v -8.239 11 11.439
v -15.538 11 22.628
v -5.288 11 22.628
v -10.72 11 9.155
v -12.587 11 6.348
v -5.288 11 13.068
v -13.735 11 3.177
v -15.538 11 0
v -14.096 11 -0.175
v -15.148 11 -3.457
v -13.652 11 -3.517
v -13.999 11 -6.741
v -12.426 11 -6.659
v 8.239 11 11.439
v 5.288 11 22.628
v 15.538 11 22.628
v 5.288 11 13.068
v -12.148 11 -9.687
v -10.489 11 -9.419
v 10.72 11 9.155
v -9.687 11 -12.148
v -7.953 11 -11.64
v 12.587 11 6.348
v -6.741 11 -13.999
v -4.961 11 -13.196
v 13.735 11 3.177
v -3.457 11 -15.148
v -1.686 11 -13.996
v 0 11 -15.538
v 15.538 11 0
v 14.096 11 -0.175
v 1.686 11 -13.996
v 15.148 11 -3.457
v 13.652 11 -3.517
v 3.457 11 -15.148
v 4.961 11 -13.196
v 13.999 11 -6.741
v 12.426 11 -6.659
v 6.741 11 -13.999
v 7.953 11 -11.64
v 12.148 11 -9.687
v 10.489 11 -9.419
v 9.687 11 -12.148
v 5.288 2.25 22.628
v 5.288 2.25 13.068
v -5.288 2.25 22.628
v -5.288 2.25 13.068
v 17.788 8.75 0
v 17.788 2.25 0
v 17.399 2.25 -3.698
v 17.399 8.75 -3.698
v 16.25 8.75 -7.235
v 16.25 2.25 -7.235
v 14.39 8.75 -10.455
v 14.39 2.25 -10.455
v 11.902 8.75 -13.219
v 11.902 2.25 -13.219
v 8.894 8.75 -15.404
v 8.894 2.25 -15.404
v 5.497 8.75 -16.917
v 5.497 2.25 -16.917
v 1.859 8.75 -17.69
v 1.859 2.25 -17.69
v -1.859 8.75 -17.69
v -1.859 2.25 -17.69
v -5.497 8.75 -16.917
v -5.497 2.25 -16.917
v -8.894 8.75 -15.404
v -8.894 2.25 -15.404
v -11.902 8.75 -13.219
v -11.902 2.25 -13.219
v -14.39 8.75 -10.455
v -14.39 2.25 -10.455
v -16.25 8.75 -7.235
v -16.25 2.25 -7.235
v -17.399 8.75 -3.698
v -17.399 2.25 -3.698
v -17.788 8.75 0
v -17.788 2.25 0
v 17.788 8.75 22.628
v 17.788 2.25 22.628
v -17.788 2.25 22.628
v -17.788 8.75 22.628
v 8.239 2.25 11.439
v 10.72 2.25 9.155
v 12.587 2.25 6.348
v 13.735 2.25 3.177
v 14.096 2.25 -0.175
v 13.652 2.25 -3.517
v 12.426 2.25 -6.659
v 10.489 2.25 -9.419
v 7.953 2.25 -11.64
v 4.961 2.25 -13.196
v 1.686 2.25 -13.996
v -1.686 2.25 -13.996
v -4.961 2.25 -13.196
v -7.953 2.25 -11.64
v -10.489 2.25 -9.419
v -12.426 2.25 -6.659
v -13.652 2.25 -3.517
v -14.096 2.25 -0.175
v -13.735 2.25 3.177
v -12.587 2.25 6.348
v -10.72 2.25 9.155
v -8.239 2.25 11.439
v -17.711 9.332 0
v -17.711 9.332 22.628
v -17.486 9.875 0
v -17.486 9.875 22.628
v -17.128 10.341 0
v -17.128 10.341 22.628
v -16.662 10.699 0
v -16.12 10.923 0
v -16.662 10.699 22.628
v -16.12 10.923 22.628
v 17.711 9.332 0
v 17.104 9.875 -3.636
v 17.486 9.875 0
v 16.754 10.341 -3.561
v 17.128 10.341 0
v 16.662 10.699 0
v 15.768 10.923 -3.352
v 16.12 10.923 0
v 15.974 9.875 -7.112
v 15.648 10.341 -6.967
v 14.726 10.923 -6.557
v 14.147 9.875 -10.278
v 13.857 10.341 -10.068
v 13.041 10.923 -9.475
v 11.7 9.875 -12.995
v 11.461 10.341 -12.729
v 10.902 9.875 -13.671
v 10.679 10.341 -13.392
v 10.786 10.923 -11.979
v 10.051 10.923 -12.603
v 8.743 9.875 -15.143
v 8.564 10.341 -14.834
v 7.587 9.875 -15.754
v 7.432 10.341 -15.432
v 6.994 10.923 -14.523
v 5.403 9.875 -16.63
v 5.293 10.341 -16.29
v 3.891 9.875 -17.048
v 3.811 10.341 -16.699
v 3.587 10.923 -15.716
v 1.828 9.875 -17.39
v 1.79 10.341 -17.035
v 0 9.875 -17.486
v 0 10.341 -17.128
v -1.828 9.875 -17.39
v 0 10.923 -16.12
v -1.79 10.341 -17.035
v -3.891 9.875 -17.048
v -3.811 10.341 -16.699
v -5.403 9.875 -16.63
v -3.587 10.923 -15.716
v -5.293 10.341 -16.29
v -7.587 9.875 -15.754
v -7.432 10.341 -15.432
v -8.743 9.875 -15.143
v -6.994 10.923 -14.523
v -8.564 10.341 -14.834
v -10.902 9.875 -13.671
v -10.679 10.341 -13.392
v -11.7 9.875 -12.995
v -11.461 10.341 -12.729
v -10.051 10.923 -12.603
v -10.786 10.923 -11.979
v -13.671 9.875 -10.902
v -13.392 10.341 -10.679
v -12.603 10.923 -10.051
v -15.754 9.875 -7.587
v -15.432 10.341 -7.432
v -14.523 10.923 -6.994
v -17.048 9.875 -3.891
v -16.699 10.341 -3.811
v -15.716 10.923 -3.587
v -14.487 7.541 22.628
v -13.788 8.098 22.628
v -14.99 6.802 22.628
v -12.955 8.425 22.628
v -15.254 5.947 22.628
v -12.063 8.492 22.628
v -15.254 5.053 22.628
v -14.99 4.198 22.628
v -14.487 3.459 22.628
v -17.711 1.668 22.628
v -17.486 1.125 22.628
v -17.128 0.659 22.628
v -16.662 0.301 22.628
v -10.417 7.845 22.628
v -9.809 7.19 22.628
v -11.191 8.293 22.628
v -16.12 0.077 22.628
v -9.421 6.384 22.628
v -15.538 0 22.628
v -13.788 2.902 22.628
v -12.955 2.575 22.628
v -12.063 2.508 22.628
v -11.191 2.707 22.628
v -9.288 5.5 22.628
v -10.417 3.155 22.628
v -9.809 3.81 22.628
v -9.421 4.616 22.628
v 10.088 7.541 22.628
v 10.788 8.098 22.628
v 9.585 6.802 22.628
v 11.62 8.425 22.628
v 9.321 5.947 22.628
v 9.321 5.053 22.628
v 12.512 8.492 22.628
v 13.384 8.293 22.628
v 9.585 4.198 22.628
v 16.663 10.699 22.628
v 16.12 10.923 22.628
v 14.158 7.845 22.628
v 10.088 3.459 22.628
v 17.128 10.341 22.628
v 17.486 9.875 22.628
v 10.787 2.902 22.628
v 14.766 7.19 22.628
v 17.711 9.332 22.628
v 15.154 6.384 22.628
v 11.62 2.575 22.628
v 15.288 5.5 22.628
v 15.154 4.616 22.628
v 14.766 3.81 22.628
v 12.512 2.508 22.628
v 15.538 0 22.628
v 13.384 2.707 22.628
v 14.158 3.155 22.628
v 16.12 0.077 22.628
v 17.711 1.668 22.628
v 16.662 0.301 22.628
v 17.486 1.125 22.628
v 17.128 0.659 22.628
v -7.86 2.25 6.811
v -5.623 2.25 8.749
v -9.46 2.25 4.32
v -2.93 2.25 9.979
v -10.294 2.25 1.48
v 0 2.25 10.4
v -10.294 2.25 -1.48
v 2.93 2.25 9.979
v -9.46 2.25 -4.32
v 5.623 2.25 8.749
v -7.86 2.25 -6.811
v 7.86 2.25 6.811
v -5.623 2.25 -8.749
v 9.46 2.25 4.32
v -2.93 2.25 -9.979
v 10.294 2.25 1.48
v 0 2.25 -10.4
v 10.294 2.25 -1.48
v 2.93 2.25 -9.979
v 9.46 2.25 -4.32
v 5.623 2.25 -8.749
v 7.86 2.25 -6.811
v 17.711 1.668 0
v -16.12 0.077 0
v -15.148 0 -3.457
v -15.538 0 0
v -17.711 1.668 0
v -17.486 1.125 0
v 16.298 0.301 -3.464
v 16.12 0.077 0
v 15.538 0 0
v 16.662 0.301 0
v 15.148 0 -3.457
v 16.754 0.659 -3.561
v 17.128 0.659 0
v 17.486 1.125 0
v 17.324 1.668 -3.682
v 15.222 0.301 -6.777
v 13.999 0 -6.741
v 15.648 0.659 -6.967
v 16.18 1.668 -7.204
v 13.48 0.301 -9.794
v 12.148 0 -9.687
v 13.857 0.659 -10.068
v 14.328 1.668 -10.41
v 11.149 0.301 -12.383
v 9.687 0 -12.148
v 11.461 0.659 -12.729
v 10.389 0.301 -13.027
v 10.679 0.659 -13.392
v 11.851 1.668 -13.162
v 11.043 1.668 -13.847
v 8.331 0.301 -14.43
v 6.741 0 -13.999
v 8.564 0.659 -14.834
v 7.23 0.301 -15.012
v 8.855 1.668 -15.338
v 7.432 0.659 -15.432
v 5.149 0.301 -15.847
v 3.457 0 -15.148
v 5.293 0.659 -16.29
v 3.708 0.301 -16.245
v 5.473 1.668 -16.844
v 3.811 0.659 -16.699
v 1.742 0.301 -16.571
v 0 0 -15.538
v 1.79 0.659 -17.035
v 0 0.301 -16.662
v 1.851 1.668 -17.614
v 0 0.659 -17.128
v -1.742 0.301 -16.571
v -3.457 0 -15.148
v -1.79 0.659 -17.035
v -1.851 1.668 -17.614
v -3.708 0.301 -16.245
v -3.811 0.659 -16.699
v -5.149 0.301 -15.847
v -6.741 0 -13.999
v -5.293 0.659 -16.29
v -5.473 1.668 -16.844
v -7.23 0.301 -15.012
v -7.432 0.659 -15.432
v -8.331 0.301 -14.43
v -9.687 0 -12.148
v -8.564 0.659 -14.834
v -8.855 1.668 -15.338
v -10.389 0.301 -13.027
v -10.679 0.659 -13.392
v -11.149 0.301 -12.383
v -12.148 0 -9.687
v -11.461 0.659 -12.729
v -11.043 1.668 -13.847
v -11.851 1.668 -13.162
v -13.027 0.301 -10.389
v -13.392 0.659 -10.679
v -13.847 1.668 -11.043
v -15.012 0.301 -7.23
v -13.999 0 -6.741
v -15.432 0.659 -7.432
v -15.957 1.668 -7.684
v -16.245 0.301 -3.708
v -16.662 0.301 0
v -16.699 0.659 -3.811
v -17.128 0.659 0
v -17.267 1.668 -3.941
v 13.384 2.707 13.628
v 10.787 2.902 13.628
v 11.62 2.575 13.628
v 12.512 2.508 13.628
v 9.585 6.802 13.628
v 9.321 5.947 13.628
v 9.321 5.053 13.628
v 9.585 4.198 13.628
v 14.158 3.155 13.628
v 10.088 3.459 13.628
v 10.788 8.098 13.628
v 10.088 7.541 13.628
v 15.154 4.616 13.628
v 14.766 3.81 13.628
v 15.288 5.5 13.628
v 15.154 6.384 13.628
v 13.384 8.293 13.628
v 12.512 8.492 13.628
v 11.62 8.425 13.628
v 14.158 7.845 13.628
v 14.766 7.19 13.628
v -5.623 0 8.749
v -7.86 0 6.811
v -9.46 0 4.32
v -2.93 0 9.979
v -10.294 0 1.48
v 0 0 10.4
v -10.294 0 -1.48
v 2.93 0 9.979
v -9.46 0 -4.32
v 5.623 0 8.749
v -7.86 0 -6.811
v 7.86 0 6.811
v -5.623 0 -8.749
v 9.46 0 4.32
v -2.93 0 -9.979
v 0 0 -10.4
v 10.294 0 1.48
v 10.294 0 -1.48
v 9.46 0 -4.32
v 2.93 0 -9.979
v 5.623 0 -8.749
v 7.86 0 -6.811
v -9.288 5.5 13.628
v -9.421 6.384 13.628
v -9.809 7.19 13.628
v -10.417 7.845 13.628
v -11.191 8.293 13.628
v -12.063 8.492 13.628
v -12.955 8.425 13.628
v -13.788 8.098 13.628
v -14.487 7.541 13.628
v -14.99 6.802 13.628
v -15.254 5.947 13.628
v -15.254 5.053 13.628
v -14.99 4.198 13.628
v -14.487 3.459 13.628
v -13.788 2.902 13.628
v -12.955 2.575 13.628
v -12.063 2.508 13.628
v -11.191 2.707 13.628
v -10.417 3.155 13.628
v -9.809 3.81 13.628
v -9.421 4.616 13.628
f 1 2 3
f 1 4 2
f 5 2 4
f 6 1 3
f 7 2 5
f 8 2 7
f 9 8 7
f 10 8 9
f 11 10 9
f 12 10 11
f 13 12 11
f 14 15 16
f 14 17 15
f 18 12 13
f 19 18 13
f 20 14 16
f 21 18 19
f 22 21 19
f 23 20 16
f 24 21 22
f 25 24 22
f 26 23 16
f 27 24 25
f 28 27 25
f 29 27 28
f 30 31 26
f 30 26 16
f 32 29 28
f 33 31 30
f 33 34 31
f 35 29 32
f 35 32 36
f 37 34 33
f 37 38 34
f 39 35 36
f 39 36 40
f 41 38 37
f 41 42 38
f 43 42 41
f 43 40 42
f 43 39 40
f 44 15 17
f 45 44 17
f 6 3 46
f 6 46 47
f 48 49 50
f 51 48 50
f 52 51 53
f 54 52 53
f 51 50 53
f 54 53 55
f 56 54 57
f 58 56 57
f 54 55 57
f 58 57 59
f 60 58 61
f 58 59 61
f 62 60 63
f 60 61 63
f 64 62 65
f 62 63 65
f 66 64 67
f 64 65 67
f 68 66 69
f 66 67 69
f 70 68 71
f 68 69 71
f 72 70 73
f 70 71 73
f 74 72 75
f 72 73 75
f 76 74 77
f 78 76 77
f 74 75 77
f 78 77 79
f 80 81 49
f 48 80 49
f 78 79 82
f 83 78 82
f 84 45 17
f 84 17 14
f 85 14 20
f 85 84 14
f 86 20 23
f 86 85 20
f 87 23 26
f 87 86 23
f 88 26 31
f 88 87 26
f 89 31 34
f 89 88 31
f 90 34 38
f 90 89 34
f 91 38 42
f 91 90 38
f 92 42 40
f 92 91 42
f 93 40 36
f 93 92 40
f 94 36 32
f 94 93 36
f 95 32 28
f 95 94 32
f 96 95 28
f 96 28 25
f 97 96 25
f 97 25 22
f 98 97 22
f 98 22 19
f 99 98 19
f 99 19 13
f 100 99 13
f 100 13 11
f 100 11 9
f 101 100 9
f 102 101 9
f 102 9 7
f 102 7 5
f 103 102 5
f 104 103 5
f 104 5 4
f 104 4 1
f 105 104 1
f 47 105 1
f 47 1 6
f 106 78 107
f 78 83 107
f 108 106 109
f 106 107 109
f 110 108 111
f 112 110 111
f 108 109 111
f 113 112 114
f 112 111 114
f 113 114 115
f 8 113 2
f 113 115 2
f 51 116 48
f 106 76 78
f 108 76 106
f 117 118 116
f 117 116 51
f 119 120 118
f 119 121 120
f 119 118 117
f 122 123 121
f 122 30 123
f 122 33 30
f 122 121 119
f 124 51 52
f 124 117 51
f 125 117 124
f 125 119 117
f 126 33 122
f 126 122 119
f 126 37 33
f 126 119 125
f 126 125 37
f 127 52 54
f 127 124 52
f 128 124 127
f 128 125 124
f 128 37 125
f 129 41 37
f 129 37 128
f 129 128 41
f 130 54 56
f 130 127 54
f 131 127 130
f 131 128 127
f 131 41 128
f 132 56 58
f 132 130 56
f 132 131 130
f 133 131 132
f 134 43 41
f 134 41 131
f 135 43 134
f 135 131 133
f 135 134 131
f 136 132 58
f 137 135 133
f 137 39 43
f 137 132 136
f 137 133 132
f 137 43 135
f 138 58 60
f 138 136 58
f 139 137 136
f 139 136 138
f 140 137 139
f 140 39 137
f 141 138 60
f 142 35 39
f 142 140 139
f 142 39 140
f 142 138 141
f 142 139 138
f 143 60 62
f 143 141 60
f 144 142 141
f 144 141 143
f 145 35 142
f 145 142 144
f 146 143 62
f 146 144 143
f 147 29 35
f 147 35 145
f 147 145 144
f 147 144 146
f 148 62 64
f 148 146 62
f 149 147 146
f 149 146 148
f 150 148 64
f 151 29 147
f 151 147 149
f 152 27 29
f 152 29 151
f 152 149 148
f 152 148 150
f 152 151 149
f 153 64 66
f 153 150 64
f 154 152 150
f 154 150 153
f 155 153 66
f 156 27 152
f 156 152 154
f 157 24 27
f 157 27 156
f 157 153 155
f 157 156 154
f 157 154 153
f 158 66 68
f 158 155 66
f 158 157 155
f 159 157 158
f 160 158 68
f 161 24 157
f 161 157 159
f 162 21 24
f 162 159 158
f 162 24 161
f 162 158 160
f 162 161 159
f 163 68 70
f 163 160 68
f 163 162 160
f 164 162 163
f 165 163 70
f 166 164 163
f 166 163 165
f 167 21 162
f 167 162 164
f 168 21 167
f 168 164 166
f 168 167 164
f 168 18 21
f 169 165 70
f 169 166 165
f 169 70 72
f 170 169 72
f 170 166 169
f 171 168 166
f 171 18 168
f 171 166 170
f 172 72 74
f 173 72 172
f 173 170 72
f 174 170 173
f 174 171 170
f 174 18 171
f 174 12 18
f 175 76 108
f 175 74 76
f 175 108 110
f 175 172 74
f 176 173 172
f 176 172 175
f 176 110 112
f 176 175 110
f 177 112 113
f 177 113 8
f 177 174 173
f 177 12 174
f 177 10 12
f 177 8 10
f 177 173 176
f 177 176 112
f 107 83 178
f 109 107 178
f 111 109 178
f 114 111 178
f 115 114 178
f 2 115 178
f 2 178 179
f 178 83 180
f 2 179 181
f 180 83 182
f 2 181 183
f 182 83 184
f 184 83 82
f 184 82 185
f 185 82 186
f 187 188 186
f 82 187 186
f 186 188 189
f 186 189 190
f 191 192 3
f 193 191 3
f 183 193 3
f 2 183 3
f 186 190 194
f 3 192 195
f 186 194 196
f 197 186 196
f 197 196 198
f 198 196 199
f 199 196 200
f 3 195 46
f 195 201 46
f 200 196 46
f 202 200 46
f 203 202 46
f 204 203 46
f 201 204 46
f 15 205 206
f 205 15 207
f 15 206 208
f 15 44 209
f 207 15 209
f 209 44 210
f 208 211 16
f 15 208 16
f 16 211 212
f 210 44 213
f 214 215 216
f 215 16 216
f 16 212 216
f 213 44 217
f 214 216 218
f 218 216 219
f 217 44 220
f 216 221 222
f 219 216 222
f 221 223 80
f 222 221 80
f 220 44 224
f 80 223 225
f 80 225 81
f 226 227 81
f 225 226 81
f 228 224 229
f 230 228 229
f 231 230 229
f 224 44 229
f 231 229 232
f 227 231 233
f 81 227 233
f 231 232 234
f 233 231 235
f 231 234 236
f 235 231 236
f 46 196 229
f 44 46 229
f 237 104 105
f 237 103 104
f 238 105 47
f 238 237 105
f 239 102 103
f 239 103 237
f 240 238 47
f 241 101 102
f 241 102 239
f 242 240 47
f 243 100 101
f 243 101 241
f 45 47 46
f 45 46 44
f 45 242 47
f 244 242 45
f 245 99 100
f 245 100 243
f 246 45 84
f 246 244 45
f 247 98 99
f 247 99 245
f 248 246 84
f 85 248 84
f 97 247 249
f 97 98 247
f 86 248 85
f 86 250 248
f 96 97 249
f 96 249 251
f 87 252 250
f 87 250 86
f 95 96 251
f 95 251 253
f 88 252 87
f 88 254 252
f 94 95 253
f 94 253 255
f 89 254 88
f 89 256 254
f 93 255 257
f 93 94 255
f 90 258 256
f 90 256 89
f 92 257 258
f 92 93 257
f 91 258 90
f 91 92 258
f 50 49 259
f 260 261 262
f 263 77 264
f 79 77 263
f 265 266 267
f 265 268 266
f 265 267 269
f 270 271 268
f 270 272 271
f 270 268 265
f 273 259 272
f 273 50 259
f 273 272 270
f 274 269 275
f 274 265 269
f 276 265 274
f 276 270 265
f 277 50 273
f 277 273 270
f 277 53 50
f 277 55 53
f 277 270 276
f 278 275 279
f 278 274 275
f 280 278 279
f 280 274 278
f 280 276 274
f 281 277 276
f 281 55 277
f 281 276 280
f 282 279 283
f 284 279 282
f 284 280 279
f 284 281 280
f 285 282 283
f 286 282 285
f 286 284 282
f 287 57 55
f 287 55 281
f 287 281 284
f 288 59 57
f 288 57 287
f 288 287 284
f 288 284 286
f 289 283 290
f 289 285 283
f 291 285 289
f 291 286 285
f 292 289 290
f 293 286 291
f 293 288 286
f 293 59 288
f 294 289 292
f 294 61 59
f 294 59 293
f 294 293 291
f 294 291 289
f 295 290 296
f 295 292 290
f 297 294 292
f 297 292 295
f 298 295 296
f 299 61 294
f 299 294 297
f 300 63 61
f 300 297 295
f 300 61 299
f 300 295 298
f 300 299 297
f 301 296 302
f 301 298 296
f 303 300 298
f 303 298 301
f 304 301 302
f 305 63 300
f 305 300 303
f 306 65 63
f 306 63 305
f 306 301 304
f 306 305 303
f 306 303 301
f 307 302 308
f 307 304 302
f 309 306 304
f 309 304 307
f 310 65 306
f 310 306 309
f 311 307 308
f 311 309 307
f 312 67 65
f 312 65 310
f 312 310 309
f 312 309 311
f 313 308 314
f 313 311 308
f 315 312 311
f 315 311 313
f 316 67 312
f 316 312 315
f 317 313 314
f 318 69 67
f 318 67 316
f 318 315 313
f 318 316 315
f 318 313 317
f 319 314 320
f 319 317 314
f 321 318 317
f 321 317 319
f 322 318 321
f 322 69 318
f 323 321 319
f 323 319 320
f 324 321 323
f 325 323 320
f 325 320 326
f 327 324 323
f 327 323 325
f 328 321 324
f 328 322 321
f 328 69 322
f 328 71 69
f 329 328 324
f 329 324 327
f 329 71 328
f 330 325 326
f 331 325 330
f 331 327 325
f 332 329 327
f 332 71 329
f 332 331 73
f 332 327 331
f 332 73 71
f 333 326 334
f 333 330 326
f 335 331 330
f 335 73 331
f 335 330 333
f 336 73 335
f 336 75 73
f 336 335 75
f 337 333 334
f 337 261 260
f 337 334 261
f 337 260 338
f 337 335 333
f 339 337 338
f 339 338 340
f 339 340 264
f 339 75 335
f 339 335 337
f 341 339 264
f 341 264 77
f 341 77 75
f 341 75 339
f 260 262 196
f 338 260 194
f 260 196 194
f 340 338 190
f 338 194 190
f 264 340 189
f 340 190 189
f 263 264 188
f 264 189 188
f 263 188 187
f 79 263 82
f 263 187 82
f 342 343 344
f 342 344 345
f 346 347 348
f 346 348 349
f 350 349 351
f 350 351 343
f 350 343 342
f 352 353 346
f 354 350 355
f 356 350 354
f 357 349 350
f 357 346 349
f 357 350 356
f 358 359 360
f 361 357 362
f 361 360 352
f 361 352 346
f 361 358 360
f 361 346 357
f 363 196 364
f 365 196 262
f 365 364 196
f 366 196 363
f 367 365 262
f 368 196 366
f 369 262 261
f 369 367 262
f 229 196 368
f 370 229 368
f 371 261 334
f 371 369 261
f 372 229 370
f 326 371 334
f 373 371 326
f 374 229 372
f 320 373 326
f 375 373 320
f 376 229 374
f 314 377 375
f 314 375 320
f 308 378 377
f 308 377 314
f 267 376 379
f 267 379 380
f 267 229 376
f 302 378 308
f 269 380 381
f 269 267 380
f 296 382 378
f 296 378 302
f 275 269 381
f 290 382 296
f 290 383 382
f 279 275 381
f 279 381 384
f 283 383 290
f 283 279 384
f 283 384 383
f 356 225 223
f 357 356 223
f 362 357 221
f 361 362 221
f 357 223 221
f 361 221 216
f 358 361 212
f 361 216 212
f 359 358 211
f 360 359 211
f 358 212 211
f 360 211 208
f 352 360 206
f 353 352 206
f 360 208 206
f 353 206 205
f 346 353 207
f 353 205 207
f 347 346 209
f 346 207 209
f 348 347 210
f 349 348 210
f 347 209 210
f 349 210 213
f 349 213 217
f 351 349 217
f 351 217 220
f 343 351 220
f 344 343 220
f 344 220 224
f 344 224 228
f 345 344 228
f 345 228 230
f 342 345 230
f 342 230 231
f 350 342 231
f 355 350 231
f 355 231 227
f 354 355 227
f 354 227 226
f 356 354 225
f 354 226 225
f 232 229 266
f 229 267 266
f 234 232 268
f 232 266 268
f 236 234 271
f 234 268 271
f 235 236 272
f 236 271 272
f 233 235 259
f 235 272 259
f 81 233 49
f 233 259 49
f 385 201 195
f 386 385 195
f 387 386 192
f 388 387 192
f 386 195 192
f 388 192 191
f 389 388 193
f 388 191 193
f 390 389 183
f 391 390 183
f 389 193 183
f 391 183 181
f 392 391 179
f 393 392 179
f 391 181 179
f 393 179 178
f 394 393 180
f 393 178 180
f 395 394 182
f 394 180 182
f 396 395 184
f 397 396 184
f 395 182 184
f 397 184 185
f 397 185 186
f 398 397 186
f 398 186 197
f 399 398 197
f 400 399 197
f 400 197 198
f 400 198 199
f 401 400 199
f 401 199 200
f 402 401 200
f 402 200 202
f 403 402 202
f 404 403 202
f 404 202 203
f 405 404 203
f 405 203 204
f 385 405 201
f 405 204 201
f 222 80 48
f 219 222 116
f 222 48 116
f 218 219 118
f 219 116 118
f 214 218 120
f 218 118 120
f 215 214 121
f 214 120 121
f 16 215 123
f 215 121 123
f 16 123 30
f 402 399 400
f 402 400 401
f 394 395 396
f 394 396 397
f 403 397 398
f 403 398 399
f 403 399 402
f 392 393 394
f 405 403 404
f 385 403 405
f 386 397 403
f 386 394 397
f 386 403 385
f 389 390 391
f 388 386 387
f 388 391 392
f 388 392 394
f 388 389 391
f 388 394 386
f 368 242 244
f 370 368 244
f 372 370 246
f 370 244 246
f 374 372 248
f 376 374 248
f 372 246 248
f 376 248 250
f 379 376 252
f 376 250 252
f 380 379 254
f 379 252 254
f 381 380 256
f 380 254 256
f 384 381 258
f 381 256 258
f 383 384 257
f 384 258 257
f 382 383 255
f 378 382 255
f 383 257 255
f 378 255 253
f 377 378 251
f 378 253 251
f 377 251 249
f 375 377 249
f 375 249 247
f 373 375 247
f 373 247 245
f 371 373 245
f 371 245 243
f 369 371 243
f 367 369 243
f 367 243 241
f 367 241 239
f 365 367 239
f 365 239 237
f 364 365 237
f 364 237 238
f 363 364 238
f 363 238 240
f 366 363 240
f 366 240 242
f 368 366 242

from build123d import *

# Parameters (mm, degrees)
SKETCH1_R           = 14.0975
BOSS_EXTRUDE1_DEPTH = 11
SKETCH4_R           = 14.0975
BOSS_EXTRUDE2_DEPTH = 2.25
SKETCH5_R           = 10.4
CUT_EXTRUDE1_DEPTH  = 2.25
SKETCH3_W           = 10.575
SKETCH3_H           = 12.228258218
CUT_EXTRUDE5_DEPTH  = 8.75
SKETCH6_R           = 3
CUT_EXTRUDE6_DEPTH  = 9
FILLET5_R           = 2.25
FILLET6_R           = 2.25


with BuildPart() as part:
    # Sketch1 → Boss-Extrude1 (new body)
    with BuildSketch(Plane(origin=(0, 0, 0), x_dir=(1, 0, 0), z_dir=(0, 1, 0))):
        with BuildLine():
            Line((-17.7875, -22.628070726), (17.7875, -22.628070726))
            Line((17.7875, -22.628070726), (17.7875, 0))
            ThreePointArc((17.7875, 0), (0, 17.7875), (-17.7875, 0))
            Line((-17.7875, 0), (-17.7875, -22.628070726))
        make_face()
        with Locations(Location((0, 0, 0), (0, 0, 270))):
            Circle(SKETCH1_R, mode=Mode.SUBTRACT)
    extrude(amount=BOSS_EXTRUDE1_DEPTH)

    # Sketch4 → Boss-Extrude2 (add)
    with BuildSketch(Plane.XZ):
        with Locations(Location((0, 0, 0), (0, 0, 270))):
            Circle(SKETCH4_R)
    extrude(amount=-BOSS_EXTRUDE2_DEPTH)

    # Sketch5 → Cut-Extrude1 (cut)
    with BuildSketch(Plane(origin=(0, 2.25, 0), x_dir=(1, 0, 0), z_dir=(0, 1, 0))):
        with Locations(Location((0, 0, 0), (0, 0, 270))):
            Circle(SKETCH5_R)
    extrude(amount=-CUT_EXTRUDE1_DEPTH, mode=Mode.SUBTRACT)

    # Sketch3 → Cut-Extrude5 (cut)
    with BuildSketch(Plane(origin=(0, 11, 0), x_dir=(1, 0, 0), z_dir=(0, 1, 0))):
        with Locations((0, -16.513941617)):
            Rectangle(SKETCH3_W, SKETCH3_H)
    extrude(amount=-CUT_EXTRUDE5_DEPTH, mode=Mode.SUBTRACT)

    # Sketch6 → Cut-Extrude6 (cut)
    with BuildSketch(Plane.XY.offset(22.628070726)):
        with Locations((-12.2875, 5.5)):
            Circle(SKETCH6_R)
        with Locations((12.2875, 5.5)):
            Circle(SKETCH6_R)
    extrude(amount=-CUT_EXTRUDE6_DEPTH, mode=Mode.SUBTRACT)

    # Fillet5
    fillet5_edges = [part.edges().sort_by_distance(p)[0] for p in [
        (17.7875, 0, 11.314035363),
        (-17.7875, 0, 11.314035363),
        (0, 0, -17.7875),
    ]]
    fillet(fillet5_edges, radius=FILLET5_R)

    # Fillet6
    fillet6_edges = [part.edges().sort_by_distance(p)[0] for p in [
        (17.7875, 11, 11.314035363),
        (0, 11, -17.7875),
        (-17.7875, 11, 11.314035363),
    ]]
    fillet(fillet6_edges, radius=FILLET6_R)


solid = part.part
